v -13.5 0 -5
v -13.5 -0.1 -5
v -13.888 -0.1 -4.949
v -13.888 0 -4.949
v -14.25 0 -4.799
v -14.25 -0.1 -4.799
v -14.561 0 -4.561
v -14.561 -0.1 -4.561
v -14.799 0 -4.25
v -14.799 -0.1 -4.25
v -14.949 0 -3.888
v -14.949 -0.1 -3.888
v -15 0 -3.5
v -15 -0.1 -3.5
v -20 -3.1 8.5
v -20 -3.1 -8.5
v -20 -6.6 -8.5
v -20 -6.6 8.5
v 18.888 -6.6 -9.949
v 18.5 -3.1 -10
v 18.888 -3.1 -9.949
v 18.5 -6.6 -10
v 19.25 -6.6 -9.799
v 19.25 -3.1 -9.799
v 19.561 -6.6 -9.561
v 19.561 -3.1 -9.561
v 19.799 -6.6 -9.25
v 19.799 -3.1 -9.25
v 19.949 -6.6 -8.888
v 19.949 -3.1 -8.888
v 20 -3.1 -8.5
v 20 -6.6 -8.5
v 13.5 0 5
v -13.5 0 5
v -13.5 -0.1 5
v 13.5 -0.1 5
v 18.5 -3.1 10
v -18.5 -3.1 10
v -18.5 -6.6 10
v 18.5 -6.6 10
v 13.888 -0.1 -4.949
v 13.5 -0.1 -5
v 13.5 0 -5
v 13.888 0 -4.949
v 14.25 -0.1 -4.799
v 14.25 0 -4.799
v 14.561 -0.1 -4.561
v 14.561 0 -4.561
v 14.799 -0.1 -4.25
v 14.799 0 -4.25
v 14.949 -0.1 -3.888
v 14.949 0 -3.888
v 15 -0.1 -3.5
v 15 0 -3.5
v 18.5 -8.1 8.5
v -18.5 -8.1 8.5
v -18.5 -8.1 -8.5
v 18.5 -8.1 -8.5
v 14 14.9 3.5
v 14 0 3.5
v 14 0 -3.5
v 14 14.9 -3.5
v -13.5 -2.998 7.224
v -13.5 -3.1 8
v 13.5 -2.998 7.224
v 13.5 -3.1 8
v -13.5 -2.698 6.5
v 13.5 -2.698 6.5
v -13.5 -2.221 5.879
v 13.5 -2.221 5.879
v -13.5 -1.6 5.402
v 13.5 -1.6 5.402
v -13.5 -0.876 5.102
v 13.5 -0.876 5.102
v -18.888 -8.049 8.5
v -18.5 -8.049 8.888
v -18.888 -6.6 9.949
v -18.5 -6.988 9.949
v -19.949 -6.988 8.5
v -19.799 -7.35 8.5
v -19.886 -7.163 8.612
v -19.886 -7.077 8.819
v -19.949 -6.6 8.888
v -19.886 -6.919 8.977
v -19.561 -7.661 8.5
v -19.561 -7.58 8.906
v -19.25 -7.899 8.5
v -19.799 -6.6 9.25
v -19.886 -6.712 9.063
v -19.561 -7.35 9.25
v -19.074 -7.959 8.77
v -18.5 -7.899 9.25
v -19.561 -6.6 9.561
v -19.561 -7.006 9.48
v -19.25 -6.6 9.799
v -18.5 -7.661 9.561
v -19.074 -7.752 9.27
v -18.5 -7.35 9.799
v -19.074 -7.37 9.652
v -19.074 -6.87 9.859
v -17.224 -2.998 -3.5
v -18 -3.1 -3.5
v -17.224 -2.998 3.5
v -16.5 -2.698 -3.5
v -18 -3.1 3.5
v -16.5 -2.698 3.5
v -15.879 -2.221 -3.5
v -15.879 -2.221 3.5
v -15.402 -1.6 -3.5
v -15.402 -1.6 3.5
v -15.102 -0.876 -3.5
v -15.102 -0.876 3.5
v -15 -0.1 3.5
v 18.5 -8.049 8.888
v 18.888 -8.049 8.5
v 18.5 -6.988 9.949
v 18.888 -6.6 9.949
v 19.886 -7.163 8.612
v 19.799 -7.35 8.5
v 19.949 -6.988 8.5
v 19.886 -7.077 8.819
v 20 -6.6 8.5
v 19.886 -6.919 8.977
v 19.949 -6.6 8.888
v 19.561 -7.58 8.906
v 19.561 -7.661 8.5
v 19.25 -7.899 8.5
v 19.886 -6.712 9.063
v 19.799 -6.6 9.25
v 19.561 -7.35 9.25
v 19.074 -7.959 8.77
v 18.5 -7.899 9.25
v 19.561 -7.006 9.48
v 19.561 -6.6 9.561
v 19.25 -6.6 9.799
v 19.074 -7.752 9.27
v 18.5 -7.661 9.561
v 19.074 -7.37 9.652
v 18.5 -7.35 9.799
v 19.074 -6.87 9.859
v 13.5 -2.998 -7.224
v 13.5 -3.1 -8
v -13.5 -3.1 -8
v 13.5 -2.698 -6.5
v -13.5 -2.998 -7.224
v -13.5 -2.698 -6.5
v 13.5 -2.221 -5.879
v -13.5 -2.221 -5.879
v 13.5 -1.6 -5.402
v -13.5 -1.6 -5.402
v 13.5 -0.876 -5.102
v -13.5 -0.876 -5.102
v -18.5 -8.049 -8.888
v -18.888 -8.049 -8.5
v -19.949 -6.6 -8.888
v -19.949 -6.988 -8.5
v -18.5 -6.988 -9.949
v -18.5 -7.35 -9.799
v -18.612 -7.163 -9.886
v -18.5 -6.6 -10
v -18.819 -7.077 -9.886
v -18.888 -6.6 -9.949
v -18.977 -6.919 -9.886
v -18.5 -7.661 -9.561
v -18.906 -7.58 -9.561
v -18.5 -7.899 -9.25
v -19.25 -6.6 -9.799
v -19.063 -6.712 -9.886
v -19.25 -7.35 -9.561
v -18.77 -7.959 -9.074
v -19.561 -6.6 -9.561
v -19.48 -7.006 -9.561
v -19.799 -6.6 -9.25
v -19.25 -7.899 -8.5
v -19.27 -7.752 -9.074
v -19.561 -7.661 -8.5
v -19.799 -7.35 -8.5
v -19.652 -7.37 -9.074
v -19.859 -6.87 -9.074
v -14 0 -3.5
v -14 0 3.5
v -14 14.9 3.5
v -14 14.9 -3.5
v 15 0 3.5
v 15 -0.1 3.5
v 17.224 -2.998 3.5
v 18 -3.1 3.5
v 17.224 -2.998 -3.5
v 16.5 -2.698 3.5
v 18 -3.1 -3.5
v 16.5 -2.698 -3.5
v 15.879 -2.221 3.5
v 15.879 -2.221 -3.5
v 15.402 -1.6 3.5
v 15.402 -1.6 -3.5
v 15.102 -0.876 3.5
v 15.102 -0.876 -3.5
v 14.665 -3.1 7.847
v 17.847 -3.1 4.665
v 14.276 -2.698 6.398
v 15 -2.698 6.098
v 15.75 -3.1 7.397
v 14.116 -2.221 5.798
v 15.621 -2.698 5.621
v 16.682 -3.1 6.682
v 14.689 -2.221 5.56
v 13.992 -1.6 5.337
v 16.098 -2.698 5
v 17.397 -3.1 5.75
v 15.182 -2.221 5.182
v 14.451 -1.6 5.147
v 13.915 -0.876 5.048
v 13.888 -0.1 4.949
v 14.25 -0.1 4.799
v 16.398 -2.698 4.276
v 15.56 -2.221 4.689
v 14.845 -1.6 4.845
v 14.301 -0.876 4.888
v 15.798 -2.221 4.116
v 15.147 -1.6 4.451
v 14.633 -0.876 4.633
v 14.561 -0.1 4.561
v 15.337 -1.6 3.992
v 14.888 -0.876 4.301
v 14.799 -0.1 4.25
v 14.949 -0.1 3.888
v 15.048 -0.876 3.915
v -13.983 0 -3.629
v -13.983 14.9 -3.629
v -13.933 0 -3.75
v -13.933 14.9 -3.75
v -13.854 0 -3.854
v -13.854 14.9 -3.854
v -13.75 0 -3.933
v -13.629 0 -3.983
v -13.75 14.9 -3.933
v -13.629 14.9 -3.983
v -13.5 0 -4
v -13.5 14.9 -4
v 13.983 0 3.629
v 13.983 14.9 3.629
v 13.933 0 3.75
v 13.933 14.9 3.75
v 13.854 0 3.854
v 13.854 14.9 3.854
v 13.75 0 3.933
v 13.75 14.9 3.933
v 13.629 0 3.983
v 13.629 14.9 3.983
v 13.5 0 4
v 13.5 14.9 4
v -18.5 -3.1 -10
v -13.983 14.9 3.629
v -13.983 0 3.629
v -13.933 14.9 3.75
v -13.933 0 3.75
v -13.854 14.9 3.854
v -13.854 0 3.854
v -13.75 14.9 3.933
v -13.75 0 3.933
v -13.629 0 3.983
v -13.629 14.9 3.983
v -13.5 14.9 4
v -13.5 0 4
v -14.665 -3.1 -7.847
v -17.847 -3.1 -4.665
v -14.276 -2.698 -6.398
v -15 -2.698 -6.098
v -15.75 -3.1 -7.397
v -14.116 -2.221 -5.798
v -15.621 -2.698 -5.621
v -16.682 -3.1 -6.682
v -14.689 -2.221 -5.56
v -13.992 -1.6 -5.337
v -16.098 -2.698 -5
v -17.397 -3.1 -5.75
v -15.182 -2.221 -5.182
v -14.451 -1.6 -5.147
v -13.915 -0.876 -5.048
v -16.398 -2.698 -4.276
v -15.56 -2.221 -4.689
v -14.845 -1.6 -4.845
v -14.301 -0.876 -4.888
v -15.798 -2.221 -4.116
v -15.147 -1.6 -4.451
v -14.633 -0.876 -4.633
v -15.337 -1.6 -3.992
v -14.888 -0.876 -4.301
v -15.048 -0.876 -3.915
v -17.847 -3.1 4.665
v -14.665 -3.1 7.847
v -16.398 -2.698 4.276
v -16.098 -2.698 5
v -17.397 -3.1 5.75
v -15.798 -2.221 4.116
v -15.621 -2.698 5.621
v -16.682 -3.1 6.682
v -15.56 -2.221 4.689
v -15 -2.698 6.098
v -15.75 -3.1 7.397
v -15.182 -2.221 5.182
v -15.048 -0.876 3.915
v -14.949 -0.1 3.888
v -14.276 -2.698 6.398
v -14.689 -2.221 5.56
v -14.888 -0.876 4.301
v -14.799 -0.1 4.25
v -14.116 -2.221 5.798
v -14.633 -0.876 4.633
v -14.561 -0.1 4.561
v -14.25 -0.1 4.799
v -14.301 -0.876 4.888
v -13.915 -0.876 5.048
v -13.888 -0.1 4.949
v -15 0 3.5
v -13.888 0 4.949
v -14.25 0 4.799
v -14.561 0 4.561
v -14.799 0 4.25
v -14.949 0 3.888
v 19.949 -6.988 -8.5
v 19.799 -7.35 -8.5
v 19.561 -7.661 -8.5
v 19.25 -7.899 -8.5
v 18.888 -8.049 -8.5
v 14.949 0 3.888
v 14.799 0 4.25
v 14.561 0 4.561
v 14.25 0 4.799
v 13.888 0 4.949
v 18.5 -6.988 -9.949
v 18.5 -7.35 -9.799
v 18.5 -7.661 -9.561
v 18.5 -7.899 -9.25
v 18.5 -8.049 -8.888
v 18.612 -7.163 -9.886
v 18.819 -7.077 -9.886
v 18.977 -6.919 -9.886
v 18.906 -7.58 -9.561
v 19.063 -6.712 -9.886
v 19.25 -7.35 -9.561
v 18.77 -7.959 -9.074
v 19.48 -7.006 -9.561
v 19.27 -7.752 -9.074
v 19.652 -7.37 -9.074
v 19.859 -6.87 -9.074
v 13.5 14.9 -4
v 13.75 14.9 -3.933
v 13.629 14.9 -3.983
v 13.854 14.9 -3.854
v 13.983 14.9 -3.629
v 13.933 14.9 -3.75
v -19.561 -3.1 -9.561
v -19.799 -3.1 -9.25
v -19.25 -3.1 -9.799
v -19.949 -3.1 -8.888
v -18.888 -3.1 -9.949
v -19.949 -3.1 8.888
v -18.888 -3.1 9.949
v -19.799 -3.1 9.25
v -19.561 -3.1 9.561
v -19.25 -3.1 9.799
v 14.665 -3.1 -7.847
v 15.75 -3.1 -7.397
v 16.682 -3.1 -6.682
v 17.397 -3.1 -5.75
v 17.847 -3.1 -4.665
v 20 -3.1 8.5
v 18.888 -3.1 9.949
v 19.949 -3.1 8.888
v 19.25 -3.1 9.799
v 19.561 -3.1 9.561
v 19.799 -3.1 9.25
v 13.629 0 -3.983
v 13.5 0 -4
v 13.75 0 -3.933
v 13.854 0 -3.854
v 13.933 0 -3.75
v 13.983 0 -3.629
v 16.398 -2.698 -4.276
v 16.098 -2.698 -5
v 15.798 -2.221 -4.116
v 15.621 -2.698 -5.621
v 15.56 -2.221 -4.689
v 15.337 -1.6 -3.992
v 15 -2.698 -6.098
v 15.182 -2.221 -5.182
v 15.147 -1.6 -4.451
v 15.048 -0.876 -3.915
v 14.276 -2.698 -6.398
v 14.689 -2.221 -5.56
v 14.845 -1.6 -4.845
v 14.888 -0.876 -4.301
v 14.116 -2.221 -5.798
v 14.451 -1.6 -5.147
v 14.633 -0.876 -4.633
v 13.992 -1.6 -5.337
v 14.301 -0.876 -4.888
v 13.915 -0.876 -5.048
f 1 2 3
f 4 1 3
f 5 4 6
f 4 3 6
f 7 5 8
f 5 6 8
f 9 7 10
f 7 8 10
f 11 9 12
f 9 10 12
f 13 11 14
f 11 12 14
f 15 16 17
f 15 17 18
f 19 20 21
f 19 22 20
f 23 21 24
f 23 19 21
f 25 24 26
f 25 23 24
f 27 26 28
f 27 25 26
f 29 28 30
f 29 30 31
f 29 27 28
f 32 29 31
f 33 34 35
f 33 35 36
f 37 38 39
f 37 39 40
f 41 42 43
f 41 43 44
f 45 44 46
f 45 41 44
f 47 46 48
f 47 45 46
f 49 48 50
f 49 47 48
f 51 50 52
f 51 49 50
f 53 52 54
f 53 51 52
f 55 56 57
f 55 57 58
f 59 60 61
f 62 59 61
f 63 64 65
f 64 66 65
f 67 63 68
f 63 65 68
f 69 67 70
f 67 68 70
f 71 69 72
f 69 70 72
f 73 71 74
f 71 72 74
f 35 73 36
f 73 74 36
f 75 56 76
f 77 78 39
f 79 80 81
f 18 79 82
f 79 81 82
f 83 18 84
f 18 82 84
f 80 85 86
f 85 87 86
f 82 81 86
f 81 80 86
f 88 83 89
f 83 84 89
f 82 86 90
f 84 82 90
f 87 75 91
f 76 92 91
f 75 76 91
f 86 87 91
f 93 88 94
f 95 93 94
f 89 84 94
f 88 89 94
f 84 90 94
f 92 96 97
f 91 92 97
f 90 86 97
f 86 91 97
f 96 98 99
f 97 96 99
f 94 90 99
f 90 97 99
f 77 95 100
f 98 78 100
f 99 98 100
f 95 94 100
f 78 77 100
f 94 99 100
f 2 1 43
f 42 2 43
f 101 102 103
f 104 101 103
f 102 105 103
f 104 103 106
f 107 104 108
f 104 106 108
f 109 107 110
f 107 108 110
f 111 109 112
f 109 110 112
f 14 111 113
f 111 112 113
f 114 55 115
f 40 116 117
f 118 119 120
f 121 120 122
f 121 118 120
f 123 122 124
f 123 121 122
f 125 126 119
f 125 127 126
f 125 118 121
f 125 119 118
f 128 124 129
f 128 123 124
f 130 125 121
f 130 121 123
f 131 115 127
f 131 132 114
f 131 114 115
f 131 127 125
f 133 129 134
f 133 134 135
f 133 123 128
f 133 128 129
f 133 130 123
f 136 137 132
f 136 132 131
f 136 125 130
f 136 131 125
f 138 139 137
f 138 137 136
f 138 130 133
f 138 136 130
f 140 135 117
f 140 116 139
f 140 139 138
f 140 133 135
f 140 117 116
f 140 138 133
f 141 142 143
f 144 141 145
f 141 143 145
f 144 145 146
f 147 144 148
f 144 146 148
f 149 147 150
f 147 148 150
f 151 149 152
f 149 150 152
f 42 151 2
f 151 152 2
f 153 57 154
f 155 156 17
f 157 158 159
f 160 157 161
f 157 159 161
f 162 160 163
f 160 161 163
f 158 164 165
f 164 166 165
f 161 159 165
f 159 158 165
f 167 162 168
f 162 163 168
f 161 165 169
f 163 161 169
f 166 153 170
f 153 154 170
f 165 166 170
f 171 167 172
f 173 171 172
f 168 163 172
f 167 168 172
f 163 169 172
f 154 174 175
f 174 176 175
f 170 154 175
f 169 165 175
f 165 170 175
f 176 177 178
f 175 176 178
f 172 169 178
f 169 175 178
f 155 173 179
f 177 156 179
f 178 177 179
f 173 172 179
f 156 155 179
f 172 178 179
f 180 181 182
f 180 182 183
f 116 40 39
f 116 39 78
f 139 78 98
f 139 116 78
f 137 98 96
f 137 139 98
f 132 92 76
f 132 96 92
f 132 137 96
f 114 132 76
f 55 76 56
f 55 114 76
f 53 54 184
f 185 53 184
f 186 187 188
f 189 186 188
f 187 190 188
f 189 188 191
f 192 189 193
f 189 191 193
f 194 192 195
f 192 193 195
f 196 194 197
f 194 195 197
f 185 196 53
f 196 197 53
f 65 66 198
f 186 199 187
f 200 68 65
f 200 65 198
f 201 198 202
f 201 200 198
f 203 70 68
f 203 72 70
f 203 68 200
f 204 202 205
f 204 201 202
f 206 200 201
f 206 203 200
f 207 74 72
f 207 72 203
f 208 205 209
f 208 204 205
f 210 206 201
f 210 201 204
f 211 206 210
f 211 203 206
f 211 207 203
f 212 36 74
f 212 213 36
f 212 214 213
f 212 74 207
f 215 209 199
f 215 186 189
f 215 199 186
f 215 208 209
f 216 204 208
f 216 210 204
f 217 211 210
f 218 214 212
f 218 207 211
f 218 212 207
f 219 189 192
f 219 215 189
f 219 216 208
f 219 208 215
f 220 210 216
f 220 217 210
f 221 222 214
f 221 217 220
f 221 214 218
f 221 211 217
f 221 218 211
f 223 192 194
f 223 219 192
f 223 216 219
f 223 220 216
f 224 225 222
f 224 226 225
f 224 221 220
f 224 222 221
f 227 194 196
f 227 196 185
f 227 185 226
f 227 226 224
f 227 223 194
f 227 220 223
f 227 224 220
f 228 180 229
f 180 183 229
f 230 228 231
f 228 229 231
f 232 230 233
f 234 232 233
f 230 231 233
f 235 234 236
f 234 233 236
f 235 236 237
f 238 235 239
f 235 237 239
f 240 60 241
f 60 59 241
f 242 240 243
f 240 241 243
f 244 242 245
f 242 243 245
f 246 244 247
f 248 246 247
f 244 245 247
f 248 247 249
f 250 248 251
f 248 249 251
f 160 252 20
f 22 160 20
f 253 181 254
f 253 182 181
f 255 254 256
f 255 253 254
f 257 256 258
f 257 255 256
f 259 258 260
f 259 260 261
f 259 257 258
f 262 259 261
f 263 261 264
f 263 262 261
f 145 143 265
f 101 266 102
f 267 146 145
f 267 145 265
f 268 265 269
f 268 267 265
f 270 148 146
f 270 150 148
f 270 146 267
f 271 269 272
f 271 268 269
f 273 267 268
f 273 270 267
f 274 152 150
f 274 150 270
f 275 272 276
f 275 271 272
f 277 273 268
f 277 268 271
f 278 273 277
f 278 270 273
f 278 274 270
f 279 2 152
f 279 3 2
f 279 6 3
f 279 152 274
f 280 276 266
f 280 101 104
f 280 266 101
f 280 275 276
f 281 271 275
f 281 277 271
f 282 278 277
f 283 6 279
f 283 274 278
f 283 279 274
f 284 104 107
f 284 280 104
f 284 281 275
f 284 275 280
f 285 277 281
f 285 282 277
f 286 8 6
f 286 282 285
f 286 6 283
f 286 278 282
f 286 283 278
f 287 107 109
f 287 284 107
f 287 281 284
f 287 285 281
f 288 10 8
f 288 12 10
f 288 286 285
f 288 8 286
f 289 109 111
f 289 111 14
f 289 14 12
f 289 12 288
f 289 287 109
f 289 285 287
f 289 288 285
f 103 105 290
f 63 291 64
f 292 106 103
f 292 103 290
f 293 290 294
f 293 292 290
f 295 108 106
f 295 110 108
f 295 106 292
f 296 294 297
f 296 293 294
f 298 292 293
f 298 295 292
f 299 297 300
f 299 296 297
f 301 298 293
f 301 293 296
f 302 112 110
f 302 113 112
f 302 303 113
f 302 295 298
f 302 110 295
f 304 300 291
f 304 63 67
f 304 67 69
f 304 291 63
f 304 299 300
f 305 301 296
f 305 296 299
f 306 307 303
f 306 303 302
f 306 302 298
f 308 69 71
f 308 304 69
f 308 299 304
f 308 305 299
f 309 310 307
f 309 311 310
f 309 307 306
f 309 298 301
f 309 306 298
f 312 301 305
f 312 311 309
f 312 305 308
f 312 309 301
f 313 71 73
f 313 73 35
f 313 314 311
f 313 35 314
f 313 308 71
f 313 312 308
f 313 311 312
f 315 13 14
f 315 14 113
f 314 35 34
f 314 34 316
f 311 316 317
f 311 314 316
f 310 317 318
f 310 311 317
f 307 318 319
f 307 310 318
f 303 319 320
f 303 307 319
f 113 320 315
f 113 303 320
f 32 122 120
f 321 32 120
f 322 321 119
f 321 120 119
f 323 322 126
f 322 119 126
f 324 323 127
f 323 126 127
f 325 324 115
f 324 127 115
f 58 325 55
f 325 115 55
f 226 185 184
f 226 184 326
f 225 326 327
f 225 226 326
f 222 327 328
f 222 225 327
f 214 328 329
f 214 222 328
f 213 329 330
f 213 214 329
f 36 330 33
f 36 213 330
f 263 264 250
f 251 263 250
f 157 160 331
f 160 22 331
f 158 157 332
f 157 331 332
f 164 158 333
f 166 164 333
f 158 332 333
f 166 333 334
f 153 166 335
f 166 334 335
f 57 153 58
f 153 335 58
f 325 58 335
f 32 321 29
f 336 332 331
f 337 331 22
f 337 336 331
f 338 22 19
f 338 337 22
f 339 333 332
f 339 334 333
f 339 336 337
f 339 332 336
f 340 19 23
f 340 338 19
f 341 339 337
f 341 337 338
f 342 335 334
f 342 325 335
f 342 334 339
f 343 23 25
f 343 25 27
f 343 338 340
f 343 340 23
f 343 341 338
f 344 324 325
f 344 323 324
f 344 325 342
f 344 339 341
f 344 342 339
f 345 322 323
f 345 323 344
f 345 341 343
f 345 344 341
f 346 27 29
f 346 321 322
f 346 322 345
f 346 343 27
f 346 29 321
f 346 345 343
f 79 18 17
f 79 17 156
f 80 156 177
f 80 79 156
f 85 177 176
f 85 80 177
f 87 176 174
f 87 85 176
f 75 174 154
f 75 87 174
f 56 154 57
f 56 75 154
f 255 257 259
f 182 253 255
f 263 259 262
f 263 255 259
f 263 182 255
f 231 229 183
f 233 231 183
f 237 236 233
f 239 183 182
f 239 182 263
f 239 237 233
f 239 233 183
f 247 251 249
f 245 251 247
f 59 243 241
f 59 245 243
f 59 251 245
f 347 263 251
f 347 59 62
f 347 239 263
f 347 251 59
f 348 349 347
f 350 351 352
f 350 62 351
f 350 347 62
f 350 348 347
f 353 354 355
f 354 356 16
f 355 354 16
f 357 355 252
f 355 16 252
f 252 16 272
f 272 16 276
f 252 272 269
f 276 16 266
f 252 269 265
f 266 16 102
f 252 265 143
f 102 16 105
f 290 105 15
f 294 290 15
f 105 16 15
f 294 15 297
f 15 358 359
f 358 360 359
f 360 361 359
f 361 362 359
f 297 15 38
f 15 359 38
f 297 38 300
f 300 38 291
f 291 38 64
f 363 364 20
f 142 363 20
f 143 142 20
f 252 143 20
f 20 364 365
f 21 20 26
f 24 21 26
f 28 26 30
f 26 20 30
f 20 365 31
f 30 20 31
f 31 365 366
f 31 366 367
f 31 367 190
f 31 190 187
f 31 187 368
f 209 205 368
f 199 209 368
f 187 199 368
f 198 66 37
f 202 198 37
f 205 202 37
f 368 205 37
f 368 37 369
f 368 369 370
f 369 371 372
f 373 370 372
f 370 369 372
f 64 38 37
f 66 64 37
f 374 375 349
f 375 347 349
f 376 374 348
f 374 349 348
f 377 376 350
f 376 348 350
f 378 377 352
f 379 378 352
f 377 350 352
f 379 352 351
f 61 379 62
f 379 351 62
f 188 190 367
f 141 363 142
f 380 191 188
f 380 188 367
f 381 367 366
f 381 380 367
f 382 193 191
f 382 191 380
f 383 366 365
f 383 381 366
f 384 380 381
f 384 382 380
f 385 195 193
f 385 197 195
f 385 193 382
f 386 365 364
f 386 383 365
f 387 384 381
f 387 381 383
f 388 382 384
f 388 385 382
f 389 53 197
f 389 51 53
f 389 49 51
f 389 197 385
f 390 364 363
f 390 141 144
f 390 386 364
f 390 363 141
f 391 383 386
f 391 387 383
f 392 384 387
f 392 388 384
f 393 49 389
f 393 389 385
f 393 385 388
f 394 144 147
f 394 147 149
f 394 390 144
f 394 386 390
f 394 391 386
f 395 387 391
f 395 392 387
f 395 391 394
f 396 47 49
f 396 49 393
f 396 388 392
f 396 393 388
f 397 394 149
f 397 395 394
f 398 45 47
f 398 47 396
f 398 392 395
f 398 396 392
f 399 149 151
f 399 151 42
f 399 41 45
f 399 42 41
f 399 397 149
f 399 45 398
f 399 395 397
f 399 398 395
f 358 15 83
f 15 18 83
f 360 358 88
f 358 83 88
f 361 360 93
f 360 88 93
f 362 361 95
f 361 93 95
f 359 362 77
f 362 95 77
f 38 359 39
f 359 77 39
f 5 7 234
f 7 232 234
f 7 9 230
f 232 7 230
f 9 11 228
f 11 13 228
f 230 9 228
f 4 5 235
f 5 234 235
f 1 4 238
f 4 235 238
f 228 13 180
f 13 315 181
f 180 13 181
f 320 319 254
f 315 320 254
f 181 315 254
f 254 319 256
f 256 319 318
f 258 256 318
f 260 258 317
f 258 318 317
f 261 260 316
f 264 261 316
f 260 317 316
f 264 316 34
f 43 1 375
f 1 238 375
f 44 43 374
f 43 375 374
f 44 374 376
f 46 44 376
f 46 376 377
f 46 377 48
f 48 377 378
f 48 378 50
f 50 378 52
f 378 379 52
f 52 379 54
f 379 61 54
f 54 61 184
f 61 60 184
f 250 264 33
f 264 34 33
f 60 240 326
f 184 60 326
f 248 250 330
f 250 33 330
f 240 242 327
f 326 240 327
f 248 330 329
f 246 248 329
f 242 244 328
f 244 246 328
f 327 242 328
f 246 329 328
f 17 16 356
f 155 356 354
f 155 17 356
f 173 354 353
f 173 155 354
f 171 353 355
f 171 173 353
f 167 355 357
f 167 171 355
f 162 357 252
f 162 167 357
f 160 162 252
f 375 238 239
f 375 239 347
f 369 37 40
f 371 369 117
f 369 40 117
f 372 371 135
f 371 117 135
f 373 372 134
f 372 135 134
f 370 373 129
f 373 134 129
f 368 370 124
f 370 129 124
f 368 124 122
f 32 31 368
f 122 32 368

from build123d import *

# Parameters (mm, degrees)
SKETCH_W     = 30
SKETCH_H     = 10
PAD_DEPTH    = 3.1
SKETCH001_W  = 40
SKETCH001_H  = 20
PAD001_DEPTH = 5
FILLET_R     = 1.5
FILLET001_R  = 3
FILLET002_R  = 1.5
SKETCH002_W  = 28
SKETCH002_H  = 8
PAD002_DEPTH = 14.9
FILLET003_R  = 0.5


with BuildPart() as part:
    # Sketch → Pad (new body)
    with BuildSketch(Plane.XZ):
        Rectangle(SKETCH_W, SKETCH_H)
    extrude(amount=PAD_DEPTH)

    # Sketch001 (on Face6 of Pad) → Pad001 (join)
    with BuildSketch(Plane.XZ.offset(3.1)):
        Rectangle(SKETCH001_W, SKETCH001_H)
    extrude(amount=PAD001_DEPTH)

    # Fillet
    fillet_edges = [part.edges().sort_by_distance(p)[0] for p in [
        (15, -1.55, 5),
        (15, -1.55, -5),
        (-15, -1.55, 5),
        (-15, -1.55, -5),
    ]]
    fillet(fillet_edges, radius=FILLET_R)

    # Fillet001
    fillet001_edges = [part.edges().sort_by_distance(p)[0] for p in [
        (0, -3.1, 5),
    ]]
    fillet(fillet001_edges, radius=FILLET001_R)

    # Fillet002
    fillet002_edges = [part.edges().sort_by_distance(p)[0] for p in [
        (0, -8.1, 10),
        (-20, -8.1, 0),
        (20, -8.1, 0),
        (0, -8.1, -10),
        (20, -5.6, 10),
        (-20, -5.6, 10),
        (20, -5.6, -10),
        (-20, -5.6, -10),
    ]]
    fillet(fillet002_edges, radius=FILLET002_R)

    # Sketch002 (on Face4 of Fillet001) → Pad002 (join)
    with BuildSketch(Plane(origin=(0, 0, 0), x_dir=(1, 0, 0), z_dir=(0, 1, 0))):
        Rectangle(SKETCH002_W, SKETCH002_H)
    extrude(amount=PAD002_DEPTH)

    # Fillet003
    fillet003_edges = [part.edges().sort_by_distance(p)[0] for p in [
        (14, 7.45, 4),
        (-14, 7.45, 4),
        (-14, 7.45, -4),
        (14, 7.45, -4),
    ]]
    fillet(fillet003_edges, radius=FILLET003_R)


solid = part.part
